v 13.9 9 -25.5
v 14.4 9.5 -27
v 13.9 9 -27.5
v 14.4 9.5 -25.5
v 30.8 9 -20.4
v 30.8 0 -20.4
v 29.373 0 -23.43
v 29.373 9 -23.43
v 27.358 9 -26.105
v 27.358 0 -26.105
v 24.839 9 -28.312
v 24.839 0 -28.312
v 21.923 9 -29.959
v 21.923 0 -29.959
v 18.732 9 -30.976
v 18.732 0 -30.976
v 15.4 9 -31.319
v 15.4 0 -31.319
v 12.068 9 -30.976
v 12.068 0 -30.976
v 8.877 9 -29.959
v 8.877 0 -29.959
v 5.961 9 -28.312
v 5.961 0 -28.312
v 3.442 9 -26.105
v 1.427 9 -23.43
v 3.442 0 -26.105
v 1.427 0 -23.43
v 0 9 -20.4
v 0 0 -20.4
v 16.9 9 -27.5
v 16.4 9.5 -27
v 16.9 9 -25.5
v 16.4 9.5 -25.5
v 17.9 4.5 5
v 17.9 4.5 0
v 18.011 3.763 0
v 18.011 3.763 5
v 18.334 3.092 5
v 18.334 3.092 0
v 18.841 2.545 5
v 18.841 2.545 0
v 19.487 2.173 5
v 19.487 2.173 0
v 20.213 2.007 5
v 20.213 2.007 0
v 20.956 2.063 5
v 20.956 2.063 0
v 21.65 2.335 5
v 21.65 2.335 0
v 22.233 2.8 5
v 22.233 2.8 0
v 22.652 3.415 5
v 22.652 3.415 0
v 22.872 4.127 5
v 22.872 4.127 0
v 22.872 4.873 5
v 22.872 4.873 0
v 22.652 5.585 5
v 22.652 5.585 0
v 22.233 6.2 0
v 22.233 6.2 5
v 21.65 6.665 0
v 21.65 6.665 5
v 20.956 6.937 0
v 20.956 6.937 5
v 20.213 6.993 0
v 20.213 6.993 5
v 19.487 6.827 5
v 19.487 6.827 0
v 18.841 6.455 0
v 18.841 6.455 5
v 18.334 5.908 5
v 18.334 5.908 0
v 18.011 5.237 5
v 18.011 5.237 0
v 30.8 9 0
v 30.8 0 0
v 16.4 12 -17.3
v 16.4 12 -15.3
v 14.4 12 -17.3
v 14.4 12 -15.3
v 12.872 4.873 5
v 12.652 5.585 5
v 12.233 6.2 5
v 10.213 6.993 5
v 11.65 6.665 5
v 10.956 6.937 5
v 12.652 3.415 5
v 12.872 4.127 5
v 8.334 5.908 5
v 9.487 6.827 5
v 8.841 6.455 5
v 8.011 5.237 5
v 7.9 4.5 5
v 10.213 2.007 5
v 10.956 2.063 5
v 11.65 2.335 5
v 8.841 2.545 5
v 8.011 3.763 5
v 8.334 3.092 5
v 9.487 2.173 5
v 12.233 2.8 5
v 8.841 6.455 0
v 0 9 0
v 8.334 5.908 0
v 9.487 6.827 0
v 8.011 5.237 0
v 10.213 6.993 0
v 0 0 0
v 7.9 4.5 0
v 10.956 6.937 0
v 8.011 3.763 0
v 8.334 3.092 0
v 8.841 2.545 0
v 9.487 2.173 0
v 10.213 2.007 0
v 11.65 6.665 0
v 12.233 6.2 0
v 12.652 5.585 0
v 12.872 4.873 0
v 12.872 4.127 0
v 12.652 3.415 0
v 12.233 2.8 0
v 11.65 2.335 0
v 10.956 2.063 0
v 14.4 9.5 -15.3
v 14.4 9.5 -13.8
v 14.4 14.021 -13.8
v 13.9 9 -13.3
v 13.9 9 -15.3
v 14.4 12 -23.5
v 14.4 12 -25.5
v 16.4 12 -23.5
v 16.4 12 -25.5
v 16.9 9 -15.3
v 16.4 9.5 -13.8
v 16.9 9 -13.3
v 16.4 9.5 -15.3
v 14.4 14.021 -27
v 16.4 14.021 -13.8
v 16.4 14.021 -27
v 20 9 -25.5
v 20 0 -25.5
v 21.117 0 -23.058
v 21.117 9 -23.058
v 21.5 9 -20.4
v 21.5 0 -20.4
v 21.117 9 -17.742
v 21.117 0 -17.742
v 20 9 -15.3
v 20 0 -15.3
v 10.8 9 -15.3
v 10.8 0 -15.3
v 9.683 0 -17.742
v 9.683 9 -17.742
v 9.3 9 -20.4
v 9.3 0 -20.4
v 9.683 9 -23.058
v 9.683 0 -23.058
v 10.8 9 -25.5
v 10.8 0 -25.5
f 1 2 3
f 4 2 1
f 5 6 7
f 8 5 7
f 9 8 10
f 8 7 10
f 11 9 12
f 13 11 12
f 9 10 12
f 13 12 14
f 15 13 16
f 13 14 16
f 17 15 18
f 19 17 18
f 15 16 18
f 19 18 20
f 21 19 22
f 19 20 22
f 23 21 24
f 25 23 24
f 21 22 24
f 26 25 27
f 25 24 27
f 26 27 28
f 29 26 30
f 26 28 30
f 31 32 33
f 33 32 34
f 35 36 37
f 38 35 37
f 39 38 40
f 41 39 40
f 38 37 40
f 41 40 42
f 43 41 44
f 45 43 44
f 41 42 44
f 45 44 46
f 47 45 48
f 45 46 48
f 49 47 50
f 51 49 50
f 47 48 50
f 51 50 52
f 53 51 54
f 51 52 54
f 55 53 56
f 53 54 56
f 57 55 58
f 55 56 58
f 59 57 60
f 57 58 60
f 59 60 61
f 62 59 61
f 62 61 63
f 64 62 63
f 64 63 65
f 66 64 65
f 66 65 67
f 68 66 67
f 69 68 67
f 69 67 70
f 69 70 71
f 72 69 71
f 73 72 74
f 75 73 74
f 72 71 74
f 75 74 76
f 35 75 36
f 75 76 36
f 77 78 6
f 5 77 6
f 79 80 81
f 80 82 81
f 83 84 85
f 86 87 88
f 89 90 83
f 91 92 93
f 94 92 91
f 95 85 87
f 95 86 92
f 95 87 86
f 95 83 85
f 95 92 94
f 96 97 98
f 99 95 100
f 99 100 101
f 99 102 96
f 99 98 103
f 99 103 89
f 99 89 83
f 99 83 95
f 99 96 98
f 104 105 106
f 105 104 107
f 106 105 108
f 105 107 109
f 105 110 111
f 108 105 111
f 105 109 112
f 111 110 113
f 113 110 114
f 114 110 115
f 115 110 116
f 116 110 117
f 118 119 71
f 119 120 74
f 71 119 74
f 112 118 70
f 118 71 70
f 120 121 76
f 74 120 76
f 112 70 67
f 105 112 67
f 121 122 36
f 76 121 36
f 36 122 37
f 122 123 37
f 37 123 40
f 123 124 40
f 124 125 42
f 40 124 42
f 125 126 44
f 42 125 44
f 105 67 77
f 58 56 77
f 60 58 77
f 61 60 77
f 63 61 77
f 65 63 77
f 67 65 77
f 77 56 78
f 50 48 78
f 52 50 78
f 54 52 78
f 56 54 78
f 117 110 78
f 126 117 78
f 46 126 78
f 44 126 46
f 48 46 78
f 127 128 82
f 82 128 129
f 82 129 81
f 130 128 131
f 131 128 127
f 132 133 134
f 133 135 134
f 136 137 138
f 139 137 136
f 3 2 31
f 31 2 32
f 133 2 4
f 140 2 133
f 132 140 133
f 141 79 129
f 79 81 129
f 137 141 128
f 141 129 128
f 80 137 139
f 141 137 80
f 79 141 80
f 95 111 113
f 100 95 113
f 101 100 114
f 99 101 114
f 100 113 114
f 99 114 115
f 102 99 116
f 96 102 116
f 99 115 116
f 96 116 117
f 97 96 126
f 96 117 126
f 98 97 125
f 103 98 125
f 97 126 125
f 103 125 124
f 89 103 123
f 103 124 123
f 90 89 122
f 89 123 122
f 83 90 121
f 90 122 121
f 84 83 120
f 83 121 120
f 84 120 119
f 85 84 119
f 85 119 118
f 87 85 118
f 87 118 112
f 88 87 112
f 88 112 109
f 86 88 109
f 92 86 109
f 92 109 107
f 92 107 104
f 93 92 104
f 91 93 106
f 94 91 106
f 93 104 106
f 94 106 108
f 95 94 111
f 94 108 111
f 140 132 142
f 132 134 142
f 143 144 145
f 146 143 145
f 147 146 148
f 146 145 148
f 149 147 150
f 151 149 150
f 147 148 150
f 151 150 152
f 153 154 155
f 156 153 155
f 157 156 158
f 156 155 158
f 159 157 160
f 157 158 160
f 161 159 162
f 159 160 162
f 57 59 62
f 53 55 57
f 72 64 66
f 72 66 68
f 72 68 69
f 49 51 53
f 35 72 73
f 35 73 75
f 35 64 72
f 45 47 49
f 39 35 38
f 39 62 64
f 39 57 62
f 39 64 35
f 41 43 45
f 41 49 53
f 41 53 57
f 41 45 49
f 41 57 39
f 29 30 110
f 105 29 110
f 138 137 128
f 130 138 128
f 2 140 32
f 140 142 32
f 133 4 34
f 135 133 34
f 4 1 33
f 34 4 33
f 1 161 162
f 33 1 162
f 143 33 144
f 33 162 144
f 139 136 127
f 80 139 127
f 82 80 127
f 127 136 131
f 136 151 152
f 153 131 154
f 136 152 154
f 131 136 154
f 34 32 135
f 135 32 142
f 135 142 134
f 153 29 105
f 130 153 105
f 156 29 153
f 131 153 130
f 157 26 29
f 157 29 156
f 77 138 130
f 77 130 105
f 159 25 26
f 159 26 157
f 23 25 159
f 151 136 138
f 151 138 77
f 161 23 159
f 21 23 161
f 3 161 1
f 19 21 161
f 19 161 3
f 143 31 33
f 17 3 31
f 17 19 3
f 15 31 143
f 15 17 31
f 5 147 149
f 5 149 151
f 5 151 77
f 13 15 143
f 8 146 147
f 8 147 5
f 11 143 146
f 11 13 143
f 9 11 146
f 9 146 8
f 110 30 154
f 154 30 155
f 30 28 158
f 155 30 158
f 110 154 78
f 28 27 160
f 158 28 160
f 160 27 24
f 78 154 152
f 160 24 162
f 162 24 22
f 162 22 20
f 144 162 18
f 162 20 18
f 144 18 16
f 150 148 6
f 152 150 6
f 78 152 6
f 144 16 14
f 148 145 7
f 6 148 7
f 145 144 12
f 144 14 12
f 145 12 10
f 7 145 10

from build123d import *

# Parameters (mm, degrees)
BOSS_EXTRUDE1_DEPTH = 9
BOSS_EXTRUDE4_DEPTH = 1
SKETCH2_R           = 2.5
BOSS_EXTRUDE2_DEPTH = 5
CHAMFER2_SIZE       = 0.5


with BuildPart() as part:
    # Sketch1 → Boss-Extrude1 (new body)
    with BuildSketch(Plane(origin=(0, 0, 0), x_dir=(1, 0, 0), z_dir=(0, 1, 0))):
        with BuildLine():
            Line((0, 20.4), (0, 0))
            Line((0, 0), (30.8, 0))
            Line((30.8, 0), (30.8, 20.4))
            ThreePointArc((30.8, 20.4), (15.4, 31.319313711), (0, 20.4))
        make_face()
        with BuildLine():
            ThreePointArc((10.8, 15.3), (9.3, 20.4), (10.8, 25.5))
            Line((10.8, 25.5), (20, 25.5))
            ThreePointArc((20, 25.5), (21.5, 20.4), (20, 15.3))
            Line((20, 15.3), (10.8, 15.3))
        make_face(mode=Mode.SUBTRACT)
    extrude(amount=BOSS_EXTRUDE1_DEPTH)

    # Sketch6 → Boss-Extrude4 (add, symmetric)
    with BuildSketch(Plane(origin=(15.4, 0, 0), x_dir=(0, 0, -1), z_dir=(1, 0, 0))):
        Polygon((15.3, 9), (15.3, 12), (17.3, 12), (13.8, 14.020725942), (13.8, 9), align=None)
        Polygon((25.5, 9), (25.5, 12), (23.5, 12), (27, 14.020725942), (27, 9), align=None)
    extrude(amount=BOSS_EXTRUDE4_DEPTH, both=True)

    # Sketch2 → Boss-Extrude2 (add)
    with BuildSketch(Plane.XY):
        with Locations(Location((10.4, 4.5, 0), (0, 0, 180))):
            Circle(SKETCH2_R)
        with Locations(Location((20.4, 4.5, 0), (0, 0, 180))):
            Circle(SKETCH2_R)
    extrude(amount=BOSS_EXTRUDE2_DEPTH)

    # Chamfer2
    chamfer2_edges = [part.edges().sort_by_distance(p)[0] for p in [
        (14.4, 9, -14.55),
        (15.4, 9, -13.8),
        (16.4, 9, -14.55),
        (14.4, 9, -26.25),
        (15.4, 9, -27),
        (16.4, 9, -26.25),
    ]]
    chamfer(chamfer2_edges, length=CHAMFER2_SIZE)


solid = part.part
